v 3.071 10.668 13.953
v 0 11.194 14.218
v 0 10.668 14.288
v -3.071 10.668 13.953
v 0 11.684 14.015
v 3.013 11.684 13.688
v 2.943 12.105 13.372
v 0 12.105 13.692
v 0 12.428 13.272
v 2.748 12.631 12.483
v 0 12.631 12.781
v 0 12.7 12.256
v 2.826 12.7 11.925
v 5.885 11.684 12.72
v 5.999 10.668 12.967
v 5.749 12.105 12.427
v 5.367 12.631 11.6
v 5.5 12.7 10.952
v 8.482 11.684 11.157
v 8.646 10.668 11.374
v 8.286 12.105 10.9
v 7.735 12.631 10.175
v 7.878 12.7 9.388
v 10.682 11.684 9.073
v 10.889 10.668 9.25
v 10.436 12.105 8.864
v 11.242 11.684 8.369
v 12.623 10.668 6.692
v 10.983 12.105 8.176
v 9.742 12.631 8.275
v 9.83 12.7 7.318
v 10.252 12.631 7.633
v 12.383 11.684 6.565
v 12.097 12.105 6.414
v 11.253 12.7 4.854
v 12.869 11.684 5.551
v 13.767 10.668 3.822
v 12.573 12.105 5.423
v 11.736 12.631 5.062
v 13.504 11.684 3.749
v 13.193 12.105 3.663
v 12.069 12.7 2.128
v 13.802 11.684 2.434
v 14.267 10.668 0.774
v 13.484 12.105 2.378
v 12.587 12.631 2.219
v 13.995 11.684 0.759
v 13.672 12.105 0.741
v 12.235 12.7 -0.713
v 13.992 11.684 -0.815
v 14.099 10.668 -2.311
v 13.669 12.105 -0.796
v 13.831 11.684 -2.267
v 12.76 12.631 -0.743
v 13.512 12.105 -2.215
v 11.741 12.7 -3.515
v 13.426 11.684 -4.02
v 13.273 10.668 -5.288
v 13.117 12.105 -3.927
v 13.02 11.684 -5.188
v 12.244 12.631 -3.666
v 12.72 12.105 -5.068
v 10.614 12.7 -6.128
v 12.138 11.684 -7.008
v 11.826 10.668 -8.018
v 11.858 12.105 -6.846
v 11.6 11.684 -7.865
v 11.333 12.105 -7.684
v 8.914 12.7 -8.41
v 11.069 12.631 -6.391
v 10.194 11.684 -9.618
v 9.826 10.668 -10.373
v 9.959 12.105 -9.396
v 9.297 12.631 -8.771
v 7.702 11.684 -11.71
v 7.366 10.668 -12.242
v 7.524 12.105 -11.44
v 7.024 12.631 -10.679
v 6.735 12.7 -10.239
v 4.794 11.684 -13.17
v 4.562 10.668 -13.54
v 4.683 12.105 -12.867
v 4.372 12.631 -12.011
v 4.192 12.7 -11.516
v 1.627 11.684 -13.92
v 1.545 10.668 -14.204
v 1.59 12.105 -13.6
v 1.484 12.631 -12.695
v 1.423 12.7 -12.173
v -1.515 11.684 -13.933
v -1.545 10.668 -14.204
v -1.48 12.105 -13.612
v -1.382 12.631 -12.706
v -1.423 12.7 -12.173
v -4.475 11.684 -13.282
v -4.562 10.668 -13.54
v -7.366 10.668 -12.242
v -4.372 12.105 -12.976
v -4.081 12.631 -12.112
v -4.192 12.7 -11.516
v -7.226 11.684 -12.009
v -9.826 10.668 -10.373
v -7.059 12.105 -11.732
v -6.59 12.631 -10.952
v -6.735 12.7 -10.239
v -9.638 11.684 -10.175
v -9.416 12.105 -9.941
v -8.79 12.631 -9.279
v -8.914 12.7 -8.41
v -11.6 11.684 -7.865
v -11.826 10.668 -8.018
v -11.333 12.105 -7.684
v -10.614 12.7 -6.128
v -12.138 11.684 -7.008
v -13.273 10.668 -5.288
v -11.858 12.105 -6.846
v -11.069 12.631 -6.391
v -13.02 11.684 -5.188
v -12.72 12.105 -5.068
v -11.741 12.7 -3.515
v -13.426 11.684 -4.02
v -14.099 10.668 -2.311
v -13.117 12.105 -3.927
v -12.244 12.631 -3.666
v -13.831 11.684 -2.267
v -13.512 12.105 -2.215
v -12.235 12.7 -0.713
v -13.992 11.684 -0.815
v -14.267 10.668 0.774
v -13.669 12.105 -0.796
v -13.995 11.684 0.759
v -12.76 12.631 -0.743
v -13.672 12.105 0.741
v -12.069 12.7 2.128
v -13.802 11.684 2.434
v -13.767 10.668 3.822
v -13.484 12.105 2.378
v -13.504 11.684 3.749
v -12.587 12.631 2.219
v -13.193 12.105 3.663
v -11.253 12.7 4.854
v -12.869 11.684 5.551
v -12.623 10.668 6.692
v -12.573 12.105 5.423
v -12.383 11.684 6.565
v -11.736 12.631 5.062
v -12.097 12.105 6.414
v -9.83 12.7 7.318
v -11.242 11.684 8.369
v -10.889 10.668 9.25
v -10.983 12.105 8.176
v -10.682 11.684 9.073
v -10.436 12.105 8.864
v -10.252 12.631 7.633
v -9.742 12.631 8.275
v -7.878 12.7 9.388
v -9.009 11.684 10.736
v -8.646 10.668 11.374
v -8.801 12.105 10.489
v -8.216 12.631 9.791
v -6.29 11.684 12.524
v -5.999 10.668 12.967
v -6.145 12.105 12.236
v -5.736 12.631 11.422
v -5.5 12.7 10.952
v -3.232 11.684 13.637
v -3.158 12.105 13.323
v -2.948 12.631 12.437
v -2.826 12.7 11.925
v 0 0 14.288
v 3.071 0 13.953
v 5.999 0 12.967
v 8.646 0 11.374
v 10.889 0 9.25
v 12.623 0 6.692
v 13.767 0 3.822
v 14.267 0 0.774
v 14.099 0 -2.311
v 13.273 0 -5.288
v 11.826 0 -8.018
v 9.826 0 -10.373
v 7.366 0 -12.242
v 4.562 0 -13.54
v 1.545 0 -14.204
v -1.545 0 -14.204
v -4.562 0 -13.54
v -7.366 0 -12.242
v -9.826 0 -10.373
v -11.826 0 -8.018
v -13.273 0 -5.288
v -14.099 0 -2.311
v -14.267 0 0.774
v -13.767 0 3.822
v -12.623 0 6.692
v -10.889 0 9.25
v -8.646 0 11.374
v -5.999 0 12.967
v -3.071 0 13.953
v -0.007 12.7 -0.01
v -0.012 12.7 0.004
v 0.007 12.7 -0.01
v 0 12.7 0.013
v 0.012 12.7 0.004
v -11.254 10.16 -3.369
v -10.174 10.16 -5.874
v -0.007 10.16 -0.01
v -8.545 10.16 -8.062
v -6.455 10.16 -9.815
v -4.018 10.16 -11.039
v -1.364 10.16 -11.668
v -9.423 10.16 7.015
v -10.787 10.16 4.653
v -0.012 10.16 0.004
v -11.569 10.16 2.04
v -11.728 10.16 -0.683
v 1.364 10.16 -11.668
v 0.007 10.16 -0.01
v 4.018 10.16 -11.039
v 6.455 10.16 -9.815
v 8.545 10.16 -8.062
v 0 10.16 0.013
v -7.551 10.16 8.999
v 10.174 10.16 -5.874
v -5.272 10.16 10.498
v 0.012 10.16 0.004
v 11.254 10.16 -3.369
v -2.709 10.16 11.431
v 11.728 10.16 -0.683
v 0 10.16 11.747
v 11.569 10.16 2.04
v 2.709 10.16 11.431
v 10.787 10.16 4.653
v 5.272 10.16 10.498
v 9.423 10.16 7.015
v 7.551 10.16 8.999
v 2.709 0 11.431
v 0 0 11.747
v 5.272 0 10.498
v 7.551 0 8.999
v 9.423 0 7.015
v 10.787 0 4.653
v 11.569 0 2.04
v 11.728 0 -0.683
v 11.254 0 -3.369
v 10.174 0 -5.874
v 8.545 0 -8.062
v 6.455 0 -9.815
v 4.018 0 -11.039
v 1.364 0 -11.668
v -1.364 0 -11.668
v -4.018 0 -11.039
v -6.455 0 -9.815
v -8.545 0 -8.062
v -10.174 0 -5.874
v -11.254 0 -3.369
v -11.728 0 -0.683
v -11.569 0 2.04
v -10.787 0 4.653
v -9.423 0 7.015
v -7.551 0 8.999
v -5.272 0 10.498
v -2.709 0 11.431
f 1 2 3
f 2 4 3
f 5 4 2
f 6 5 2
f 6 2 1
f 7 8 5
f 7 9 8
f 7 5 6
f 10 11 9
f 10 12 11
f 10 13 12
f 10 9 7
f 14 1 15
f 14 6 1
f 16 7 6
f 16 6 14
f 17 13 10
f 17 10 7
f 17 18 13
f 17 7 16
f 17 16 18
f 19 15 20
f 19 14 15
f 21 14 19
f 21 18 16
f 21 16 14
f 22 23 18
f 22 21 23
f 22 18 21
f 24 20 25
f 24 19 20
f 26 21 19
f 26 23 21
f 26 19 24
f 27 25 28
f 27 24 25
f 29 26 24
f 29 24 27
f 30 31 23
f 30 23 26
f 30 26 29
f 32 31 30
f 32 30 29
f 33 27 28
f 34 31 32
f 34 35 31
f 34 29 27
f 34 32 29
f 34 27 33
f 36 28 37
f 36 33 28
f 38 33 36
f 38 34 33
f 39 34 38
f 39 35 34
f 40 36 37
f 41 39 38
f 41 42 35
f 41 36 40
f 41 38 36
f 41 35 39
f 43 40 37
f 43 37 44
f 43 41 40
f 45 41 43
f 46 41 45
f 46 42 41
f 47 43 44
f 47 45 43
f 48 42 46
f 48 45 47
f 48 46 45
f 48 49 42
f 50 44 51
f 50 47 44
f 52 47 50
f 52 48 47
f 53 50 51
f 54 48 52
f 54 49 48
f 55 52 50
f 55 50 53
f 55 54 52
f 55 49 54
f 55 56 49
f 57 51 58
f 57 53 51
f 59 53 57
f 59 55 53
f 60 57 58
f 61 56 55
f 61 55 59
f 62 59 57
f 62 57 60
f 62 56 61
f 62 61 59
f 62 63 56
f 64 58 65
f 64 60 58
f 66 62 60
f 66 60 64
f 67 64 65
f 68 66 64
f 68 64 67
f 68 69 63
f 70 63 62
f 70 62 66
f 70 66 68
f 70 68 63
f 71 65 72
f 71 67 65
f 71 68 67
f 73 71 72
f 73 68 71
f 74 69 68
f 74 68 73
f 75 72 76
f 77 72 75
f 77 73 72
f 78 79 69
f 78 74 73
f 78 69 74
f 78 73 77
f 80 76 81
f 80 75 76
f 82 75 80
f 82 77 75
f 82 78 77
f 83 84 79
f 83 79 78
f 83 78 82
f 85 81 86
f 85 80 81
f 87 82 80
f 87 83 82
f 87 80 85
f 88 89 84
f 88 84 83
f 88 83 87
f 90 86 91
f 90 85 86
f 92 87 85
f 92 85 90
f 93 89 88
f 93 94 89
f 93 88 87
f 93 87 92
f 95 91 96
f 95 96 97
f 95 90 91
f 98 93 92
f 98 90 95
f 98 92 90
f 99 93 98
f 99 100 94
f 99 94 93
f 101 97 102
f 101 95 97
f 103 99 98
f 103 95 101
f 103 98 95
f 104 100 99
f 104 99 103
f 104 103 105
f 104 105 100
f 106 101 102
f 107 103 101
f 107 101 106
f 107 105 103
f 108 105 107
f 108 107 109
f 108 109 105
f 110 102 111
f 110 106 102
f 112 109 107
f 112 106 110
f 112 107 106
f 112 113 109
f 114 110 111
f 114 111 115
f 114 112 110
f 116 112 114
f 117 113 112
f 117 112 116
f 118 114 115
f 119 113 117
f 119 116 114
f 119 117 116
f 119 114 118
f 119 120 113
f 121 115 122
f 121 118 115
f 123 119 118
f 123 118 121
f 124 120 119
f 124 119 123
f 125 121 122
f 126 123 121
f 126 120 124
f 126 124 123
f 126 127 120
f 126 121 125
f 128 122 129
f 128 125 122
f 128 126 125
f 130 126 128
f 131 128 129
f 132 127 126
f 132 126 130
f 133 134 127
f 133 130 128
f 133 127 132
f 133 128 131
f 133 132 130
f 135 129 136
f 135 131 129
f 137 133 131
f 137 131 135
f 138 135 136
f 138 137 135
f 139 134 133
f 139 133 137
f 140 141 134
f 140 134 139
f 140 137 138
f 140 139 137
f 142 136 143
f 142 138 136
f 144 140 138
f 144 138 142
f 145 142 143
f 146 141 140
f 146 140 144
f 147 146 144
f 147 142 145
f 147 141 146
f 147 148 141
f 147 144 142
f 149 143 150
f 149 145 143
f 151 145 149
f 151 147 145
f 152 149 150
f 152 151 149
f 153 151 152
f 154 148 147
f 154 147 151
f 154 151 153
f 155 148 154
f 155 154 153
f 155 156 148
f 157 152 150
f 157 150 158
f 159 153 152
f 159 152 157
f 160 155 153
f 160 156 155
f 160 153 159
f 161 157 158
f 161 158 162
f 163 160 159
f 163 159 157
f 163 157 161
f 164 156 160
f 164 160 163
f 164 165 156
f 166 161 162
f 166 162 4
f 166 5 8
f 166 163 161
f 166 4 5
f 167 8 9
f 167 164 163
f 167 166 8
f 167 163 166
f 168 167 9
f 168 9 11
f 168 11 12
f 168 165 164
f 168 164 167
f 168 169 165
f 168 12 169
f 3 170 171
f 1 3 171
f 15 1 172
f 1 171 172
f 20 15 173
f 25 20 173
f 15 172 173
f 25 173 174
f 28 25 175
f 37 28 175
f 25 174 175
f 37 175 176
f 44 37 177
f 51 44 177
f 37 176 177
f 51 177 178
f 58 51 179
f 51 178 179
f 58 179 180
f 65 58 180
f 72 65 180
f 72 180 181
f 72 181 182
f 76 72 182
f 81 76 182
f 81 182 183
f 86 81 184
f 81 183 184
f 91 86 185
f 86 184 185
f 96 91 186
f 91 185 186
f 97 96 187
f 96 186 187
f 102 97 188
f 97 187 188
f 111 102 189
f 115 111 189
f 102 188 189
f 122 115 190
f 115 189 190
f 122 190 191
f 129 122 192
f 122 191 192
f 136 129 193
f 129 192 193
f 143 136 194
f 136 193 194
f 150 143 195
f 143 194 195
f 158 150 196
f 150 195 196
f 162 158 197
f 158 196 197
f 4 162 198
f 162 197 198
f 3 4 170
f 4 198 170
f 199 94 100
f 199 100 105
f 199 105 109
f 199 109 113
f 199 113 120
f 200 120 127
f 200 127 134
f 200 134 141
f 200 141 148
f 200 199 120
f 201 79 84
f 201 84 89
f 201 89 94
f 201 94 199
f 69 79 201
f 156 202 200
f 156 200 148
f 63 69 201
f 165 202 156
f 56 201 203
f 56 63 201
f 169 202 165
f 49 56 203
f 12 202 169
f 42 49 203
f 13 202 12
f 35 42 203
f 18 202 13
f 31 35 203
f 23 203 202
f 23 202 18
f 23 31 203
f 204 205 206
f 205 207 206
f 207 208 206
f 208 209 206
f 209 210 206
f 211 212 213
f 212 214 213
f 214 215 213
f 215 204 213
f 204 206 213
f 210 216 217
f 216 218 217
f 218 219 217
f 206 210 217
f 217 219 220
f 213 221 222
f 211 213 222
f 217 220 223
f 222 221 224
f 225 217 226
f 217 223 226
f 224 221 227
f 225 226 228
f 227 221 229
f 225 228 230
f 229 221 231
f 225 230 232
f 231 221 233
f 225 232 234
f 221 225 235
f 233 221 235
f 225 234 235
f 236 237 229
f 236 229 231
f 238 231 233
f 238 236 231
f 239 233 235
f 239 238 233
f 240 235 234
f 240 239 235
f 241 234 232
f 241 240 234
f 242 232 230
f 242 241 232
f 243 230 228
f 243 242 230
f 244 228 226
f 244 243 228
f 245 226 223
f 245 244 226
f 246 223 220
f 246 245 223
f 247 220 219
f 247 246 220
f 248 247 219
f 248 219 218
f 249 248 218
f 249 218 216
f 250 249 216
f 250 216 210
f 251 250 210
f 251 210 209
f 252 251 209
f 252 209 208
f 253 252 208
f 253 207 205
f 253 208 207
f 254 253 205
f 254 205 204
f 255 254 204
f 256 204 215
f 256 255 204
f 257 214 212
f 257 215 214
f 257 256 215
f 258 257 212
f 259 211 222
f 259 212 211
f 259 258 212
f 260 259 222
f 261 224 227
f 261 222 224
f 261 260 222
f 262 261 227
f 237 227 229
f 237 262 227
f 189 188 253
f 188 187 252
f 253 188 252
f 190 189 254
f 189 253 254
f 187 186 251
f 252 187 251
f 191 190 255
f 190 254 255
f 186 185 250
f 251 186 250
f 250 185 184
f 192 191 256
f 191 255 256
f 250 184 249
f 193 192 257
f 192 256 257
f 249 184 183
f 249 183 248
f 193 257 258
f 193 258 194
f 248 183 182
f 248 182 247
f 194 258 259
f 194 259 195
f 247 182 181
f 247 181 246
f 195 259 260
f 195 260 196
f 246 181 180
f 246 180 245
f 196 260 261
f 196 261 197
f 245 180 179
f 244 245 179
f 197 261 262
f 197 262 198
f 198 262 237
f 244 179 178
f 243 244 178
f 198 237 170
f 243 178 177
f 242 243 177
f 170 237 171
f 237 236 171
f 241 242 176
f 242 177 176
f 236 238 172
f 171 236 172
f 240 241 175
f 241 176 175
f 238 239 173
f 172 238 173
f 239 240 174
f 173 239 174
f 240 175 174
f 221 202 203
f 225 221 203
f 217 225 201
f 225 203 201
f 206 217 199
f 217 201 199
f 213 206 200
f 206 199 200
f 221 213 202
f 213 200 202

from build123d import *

# Parameters (mm, degrees)
SKETCH1_R           = 14.2875
BOSS_EXTRUDE1_DEPTH = 12.7
FILLET1_R           = 2.032
SHELL1_T            = -2.54
CUT_EXTRUDE1_REACH  = 25.865
SKETCH2_R           = 0.0127


with BuildPart() as part:
    # Sketch1 → Boss-Extrude1 (new body)
    with BuildSketch(Plane(origin=(0, 0, 0), x_dir=(1, 0, 0), z_dir=(0, 1, 0))):
        with Locations(Location((0, 0, 0), (0, 0, 270))):
            Circle(SKETCH1_R)
    extrude(amount=BOSS_EXTRUDE1_DEPTH)

    # Fillet1
    fillet1_edges = [part.edges().sort_by_distance(p)[0] for p in [
        (0, 12.7, -14.2875),
    ]]
    fillet(fillet1_edges, radius=FILLET1_R)

    # Shell1
    shell1_openings = [part.faces().sort_by_distance(p)[0] for p in [
        (0, 0, 0),
    ]]
    offset(amount=SHELL1_T, openings=shell1_openings, kind=Kind.INTERSECTION)

    # Sketch2 → Cut-Extrude1 (cut, up to next)
    with BuildSketch(Plane(origin=(0, 12.7, 0), x_dir=(1, 0, 0), z_dir=(0, 1, 0)), mode=Mode.PRIVATE) as cut_extrude1_sk1:
        with Locations(Location((0, 0, 0), (0, 0, 270))):
            Circle(SKETCH2_R)
    cut_extrude1_tool1 = extrude(cut_extrude1_sk1.sketch, amount=-CUT_EXTRUDE1_REACH, mode=Mode.PRIVATE) & part.part
    add(cut_extrude1_tool1.solids().sort_by_distance((0, 12.7, 0))[0], mode=Mode.SUBTRACT)


solid = part.part
